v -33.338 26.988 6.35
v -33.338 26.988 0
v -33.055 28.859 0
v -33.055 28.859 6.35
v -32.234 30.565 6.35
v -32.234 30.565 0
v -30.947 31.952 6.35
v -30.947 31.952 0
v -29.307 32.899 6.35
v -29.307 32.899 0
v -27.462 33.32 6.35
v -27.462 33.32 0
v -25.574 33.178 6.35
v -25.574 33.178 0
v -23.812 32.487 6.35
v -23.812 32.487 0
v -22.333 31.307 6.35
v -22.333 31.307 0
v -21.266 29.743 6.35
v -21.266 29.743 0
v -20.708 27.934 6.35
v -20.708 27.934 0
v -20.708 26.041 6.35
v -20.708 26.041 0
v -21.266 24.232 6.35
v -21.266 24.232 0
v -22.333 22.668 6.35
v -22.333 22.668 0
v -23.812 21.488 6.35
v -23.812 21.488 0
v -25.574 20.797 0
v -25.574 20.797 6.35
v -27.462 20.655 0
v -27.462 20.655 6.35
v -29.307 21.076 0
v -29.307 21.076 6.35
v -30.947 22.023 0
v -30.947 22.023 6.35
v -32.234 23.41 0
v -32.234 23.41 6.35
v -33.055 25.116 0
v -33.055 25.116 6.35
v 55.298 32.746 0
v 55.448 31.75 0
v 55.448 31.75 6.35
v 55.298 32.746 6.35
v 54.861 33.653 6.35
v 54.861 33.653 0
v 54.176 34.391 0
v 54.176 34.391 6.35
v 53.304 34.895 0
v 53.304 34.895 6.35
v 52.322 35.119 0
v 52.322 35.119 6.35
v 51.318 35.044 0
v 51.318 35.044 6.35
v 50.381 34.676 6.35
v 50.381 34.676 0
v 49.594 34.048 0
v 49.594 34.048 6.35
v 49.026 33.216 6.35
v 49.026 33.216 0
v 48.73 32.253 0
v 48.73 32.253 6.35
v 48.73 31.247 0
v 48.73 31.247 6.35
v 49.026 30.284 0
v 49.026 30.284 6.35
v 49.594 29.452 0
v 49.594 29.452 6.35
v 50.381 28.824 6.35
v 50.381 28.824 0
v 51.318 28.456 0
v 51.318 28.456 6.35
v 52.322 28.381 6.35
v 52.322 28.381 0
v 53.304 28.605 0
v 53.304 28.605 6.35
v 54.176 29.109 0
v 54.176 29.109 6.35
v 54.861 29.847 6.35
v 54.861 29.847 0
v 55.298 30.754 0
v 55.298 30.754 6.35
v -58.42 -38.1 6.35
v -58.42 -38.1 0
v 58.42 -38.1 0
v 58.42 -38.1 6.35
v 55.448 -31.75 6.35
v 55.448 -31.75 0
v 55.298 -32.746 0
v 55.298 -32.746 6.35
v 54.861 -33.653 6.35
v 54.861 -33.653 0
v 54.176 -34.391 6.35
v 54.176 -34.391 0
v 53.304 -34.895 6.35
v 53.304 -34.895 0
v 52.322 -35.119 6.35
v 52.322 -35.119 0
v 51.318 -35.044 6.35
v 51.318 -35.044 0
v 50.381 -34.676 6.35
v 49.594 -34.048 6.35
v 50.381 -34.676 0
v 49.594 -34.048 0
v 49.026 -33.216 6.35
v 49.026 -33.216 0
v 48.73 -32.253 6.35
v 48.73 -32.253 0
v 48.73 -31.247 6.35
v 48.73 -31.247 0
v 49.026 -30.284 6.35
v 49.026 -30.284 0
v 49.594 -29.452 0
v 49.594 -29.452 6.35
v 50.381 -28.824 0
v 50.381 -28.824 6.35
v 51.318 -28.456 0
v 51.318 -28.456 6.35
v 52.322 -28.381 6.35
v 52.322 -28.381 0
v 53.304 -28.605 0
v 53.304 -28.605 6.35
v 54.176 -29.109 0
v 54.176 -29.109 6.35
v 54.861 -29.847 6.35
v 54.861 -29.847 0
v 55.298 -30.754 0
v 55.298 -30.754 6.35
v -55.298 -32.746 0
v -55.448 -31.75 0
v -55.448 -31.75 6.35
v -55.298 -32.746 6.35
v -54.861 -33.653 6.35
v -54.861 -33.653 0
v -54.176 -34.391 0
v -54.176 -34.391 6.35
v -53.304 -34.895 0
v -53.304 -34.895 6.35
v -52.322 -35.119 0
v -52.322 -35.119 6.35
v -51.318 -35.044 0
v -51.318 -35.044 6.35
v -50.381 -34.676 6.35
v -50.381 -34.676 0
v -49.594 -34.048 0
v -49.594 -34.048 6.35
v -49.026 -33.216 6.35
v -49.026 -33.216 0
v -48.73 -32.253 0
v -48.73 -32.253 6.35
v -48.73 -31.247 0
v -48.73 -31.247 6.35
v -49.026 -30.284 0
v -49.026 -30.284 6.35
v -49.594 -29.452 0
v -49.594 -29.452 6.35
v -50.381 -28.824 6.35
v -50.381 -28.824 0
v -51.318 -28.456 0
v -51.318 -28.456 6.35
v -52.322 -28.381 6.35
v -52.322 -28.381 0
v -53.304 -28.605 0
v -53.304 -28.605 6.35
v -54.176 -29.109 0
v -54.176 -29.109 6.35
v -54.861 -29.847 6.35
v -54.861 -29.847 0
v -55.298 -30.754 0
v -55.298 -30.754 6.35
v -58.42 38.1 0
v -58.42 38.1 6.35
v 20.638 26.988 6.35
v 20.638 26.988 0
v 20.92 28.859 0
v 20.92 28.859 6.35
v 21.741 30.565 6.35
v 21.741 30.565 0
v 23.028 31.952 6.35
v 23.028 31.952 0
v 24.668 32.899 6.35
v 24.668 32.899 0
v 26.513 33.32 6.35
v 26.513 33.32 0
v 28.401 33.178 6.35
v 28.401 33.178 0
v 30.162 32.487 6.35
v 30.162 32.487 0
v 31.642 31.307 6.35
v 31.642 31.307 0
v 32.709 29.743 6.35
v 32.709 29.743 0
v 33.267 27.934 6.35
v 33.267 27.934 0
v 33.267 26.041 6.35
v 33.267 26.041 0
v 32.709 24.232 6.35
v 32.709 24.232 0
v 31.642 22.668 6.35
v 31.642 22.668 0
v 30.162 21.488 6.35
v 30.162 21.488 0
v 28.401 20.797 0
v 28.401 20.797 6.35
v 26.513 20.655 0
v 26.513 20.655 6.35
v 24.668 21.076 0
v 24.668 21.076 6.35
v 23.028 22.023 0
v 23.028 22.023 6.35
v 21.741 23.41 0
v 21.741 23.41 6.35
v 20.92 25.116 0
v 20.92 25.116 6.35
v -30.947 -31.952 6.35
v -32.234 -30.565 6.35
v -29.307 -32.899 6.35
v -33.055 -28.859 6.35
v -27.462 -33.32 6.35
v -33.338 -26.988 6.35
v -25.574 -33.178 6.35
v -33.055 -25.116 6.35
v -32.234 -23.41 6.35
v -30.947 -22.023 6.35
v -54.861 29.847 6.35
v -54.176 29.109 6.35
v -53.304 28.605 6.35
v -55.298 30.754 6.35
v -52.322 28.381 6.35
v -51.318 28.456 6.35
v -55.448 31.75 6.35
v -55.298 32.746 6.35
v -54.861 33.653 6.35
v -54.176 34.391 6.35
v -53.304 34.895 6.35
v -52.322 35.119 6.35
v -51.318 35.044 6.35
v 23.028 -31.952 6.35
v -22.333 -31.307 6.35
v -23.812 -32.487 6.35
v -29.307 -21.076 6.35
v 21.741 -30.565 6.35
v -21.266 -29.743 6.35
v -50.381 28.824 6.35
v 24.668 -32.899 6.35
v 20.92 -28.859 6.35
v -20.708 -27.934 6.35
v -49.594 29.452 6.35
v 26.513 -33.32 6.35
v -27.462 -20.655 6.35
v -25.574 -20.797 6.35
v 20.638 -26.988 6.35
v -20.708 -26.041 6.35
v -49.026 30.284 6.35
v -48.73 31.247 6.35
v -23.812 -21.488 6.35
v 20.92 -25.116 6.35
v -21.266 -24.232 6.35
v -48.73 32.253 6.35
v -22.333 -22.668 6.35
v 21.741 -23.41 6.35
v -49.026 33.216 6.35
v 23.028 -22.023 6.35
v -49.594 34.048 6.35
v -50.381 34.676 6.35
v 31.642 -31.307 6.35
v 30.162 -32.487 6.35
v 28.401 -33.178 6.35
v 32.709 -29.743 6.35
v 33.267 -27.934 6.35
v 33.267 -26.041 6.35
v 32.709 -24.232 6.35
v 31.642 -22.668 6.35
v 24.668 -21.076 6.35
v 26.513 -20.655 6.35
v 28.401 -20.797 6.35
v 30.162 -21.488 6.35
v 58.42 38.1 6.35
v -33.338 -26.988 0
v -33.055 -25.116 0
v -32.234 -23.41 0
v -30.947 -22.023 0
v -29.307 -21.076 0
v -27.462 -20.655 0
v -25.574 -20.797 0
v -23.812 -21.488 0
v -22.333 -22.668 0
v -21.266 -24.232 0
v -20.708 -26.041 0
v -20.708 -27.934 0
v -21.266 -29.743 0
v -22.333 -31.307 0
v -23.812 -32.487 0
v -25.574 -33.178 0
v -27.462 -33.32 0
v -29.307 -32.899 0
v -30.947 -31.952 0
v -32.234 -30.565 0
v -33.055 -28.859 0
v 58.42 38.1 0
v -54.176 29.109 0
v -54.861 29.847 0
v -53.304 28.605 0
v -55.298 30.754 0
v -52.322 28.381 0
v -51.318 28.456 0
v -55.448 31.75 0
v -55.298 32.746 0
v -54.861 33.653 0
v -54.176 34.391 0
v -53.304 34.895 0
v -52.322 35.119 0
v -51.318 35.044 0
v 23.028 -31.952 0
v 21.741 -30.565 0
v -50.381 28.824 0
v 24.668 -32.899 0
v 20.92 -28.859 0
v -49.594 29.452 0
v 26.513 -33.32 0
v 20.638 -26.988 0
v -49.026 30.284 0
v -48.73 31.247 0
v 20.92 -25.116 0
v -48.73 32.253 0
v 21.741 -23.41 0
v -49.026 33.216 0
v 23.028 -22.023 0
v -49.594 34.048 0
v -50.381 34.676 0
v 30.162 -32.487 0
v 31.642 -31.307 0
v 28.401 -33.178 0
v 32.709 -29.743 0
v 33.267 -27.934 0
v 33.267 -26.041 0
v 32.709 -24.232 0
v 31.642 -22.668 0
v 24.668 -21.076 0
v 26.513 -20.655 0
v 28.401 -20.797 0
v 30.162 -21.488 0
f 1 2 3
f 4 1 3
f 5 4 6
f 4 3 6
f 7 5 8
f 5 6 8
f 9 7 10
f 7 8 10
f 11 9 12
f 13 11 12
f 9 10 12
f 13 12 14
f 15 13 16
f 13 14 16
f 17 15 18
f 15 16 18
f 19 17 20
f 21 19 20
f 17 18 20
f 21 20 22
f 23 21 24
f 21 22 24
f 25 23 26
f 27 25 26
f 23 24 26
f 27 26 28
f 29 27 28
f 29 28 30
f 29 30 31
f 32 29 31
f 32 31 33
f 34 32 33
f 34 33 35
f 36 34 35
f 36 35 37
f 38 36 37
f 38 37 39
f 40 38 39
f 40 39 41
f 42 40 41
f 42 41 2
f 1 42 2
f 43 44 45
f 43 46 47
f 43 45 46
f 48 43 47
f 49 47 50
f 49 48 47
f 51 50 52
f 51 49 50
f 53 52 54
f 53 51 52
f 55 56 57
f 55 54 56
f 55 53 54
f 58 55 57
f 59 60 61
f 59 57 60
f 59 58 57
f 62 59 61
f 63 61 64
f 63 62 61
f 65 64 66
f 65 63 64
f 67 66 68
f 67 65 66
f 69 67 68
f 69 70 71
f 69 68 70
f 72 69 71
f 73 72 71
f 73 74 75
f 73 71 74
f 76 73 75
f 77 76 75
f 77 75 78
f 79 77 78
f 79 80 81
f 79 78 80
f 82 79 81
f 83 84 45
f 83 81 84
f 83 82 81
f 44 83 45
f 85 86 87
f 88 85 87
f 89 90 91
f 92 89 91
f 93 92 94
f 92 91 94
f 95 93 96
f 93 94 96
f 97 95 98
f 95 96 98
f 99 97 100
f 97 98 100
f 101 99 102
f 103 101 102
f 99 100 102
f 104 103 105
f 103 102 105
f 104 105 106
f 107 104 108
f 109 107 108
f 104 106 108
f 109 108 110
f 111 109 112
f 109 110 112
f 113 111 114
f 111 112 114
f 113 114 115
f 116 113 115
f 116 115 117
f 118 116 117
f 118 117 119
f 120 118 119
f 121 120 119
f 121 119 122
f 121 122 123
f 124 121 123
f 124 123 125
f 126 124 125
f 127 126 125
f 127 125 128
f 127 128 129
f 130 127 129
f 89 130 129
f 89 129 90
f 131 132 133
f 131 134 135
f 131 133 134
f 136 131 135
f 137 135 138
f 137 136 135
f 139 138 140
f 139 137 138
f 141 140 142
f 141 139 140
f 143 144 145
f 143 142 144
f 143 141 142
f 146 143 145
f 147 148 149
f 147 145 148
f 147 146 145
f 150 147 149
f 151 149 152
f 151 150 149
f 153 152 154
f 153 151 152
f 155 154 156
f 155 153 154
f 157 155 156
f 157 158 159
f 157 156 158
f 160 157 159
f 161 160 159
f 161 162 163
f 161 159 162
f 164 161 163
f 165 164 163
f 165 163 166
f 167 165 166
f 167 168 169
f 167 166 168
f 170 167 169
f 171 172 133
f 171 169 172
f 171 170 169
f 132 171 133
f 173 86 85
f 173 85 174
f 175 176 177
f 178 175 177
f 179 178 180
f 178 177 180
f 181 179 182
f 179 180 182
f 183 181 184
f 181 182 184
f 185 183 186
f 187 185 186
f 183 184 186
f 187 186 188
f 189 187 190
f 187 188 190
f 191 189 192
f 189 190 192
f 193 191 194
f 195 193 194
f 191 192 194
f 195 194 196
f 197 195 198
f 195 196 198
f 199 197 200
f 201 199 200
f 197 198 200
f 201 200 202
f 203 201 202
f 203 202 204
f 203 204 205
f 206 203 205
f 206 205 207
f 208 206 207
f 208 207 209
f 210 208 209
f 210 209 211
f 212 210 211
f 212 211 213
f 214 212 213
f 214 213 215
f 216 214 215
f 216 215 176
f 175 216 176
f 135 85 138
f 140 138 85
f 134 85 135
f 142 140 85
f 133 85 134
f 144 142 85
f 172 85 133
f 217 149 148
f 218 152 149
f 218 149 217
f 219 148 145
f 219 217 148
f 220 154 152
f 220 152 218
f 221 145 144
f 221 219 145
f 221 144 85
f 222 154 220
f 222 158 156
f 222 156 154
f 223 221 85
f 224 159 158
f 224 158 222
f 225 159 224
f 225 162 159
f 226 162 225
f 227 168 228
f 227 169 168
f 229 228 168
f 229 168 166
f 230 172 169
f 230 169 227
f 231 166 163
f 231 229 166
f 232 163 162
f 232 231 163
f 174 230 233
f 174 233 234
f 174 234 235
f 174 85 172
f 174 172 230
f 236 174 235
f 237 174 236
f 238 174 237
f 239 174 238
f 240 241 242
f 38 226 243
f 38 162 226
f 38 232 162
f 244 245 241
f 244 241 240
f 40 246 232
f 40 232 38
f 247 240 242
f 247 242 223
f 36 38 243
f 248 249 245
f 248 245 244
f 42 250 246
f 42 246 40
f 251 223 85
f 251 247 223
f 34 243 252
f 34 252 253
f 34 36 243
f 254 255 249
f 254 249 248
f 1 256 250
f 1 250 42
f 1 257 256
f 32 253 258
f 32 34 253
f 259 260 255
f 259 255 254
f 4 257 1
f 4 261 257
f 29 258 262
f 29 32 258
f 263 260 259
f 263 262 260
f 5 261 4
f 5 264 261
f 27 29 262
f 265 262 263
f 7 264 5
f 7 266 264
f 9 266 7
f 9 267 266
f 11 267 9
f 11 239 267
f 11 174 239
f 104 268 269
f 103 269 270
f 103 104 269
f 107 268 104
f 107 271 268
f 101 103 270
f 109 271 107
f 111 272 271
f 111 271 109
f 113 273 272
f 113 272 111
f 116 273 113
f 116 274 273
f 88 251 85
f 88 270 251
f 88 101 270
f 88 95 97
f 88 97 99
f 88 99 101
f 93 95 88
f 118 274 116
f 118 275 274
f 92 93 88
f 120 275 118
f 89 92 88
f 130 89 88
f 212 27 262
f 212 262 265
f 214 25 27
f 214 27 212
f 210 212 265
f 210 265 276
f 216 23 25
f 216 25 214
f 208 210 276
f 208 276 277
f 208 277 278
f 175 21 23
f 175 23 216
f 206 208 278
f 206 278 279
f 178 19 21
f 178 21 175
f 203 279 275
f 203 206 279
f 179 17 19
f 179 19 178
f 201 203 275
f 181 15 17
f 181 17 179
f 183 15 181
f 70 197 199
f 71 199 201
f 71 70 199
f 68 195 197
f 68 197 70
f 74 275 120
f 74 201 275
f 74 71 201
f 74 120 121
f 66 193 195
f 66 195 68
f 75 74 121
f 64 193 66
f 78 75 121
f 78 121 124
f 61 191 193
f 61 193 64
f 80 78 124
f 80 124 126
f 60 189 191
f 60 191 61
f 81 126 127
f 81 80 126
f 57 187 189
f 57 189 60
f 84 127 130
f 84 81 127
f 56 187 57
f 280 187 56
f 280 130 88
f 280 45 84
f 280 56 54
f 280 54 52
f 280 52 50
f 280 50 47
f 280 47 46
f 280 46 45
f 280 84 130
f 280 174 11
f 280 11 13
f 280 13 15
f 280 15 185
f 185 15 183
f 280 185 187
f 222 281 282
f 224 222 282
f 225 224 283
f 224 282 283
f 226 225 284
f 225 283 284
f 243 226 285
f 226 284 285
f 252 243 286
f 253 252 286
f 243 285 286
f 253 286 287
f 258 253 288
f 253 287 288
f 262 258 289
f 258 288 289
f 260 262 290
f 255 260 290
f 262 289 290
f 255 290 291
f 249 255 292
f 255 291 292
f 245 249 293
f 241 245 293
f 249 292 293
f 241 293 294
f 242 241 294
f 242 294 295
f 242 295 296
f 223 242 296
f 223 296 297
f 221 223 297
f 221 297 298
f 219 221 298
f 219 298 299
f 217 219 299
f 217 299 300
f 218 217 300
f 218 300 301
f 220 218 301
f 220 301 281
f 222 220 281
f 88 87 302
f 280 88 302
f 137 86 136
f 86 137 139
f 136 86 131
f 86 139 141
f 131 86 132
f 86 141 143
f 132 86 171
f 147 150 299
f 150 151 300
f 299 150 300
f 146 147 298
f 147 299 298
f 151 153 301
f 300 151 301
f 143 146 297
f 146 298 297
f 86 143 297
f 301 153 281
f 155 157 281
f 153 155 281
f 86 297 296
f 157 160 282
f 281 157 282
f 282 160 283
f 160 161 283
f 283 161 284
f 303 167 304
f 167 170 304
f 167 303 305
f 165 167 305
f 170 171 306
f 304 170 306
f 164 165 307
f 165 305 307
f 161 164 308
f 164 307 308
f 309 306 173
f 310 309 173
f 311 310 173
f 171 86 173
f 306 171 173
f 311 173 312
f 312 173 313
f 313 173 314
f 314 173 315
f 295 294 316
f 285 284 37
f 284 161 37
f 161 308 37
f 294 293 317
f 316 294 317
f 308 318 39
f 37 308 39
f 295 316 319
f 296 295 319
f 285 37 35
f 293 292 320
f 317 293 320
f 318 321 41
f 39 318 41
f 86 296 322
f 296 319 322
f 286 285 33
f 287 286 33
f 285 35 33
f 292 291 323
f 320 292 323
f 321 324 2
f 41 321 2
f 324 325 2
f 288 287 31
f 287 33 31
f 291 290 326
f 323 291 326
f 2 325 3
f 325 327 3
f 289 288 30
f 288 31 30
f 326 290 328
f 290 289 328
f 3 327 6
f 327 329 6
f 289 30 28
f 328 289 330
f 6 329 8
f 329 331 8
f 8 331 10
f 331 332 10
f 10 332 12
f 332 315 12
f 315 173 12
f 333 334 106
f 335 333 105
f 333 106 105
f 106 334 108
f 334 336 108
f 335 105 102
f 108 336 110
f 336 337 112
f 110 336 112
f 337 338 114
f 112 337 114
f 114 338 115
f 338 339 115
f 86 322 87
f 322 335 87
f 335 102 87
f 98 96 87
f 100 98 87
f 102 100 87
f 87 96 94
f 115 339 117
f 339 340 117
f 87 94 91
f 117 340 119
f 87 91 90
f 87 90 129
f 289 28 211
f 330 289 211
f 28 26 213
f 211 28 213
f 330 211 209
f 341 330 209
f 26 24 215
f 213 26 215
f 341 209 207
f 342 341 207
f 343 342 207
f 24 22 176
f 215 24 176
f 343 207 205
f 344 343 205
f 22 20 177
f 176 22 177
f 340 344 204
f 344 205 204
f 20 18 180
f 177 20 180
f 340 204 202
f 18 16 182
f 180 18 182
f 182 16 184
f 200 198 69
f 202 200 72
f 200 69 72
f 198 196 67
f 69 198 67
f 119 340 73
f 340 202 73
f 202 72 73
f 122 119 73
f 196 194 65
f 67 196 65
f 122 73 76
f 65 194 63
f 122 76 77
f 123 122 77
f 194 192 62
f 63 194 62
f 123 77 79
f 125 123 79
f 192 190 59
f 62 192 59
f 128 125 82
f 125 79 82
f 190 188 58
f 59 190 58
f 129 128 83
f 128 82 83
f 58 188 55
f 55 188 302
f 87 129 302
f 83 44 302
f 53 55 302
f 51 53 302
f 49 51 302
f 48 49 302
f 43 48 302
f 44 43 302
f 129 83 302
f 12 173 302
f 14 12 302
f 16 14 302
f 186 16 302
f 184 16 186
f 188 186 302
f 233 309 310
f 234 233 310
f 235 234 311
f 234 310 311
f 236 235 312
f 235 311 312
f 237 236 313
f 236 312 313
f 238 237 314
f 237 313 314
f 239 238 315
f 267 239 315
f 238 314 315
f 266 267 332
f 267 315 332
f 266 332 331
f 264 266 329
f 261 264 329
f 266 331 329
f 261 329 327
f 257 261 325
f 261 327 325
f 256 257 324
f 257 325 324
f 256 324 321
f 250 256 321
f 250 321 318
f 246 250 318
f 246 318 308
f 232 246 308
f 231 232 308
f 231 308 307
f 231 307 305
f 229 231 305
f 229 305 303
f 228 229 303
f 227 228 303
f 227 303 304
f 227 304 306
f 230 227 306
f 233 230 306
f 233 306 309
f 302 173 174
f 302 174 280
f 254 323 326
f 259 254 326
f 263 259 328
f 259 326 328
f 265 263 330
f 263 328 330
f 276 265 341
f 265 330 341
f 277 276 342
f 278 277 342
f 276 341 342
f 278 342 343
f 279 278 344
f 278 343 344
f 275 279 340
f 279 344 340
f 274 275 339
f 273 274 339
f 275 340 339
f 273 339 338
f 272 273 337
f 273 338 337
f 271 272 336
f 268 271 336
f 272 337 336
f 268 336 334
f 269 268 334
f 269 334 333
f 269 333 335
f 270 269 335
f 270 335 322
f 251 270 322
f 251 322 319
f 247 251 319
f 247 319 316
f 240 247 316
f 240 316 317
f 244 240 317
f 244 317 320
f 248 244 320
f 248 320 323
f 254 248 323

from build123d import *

# Parameters (mm, degrees)
SKETCH1_W                      = 116.84
SKETCH1_H                      = 76.2
EXTRUDE1_DEPTH                 = 6.35
F_1_4_CLEARANCE_HOLE1_D        = 6.7564
MIRROR2_COPY_1_D               = 6.7564
F_1_2_0_5_DIAMETER_HOLE1_D     = 12.7
F_1_2_0_5_DIAMETER_HOLE1_DEPTH = 17.78
F_1_2_0_5_DIAMETER_HOLE1_TIP   = 3.815464931


with BuildPart() as part:
    # Sketch1 → Extrude1 (new body)
    with BuildSketch(Plane.XY):
        Rectangle(SKETCH1_W, SKETCH1_H)
    extrude(amount=EXTRUDE1_DEPTH)

    # 1/4 Clearance Hole1 (through all)
    with Locations(Plane(origin=(-52.07, 31.75, 6.35), x_dir=(1, 0, 0), z_dir=(0, 0, 1))):
        with Locations((0, 0)):
            f_1_4_clearance_hole1 = Hole(F_1_4_CLEARANCE_HOLE1_D / 2)

    # Mirror1: 1/4 Clearance Hole1 across plane
    add(f_1_4_clearance_hole1.mirror(Plane.ZX), mode=Mode.SUBTRACT)

    # Mirror2: 1/4 Clearance Hole1 across plane
    add(f_1_4_clearance_hole1.mirror(Plane(origin=(0, 0, 0), x_dir=(0, 0, 1), z_dir=(1, 0, 0))), mode=Mode.SUBTRACT)

    # Mirror2 copy 1 (through all)
    with Locations(Plane(origin=(52.07, -31.75, 6.35), x_dir=(-1, 0, 0), z_dir=(0, 0, 1))):
        with Locations((0, 0)):
            Hole(MIRROR2_COPY_1_D / 2)

    # 1/2 (0.5) Diameter Hole1
    with Locations(Plane(origin=(-26.9875, 26.9875, 6.35), x_dir=(1, 0, 0), z_dir=(0, 0, 1))):
        with Locations((0, 0), (53.975, 0), (53.975, -53.975), (0, -53.975)):
            Hole(F_1_2_0_5_DIAMETER_HOLE1_D / 2, depth=F_1_2_0_5_DIAMETER_HOLE1_DEPTH)
            with Locations((0, 0, -(F_1_2_0_5_DIAMETER_HOLE1_DEPTH + F_1_2_0_5_DIAMETER_HOLE1_TIP / 2))):  # 118° drill point
                Cone(0, F_1_2_0_5_DIAMETER_HOLE1_D / 2, F_1_2_0_5_DIAMETER_HOLE1_TIP, mode=Mode.SUBTRACT)


solid = part.part
